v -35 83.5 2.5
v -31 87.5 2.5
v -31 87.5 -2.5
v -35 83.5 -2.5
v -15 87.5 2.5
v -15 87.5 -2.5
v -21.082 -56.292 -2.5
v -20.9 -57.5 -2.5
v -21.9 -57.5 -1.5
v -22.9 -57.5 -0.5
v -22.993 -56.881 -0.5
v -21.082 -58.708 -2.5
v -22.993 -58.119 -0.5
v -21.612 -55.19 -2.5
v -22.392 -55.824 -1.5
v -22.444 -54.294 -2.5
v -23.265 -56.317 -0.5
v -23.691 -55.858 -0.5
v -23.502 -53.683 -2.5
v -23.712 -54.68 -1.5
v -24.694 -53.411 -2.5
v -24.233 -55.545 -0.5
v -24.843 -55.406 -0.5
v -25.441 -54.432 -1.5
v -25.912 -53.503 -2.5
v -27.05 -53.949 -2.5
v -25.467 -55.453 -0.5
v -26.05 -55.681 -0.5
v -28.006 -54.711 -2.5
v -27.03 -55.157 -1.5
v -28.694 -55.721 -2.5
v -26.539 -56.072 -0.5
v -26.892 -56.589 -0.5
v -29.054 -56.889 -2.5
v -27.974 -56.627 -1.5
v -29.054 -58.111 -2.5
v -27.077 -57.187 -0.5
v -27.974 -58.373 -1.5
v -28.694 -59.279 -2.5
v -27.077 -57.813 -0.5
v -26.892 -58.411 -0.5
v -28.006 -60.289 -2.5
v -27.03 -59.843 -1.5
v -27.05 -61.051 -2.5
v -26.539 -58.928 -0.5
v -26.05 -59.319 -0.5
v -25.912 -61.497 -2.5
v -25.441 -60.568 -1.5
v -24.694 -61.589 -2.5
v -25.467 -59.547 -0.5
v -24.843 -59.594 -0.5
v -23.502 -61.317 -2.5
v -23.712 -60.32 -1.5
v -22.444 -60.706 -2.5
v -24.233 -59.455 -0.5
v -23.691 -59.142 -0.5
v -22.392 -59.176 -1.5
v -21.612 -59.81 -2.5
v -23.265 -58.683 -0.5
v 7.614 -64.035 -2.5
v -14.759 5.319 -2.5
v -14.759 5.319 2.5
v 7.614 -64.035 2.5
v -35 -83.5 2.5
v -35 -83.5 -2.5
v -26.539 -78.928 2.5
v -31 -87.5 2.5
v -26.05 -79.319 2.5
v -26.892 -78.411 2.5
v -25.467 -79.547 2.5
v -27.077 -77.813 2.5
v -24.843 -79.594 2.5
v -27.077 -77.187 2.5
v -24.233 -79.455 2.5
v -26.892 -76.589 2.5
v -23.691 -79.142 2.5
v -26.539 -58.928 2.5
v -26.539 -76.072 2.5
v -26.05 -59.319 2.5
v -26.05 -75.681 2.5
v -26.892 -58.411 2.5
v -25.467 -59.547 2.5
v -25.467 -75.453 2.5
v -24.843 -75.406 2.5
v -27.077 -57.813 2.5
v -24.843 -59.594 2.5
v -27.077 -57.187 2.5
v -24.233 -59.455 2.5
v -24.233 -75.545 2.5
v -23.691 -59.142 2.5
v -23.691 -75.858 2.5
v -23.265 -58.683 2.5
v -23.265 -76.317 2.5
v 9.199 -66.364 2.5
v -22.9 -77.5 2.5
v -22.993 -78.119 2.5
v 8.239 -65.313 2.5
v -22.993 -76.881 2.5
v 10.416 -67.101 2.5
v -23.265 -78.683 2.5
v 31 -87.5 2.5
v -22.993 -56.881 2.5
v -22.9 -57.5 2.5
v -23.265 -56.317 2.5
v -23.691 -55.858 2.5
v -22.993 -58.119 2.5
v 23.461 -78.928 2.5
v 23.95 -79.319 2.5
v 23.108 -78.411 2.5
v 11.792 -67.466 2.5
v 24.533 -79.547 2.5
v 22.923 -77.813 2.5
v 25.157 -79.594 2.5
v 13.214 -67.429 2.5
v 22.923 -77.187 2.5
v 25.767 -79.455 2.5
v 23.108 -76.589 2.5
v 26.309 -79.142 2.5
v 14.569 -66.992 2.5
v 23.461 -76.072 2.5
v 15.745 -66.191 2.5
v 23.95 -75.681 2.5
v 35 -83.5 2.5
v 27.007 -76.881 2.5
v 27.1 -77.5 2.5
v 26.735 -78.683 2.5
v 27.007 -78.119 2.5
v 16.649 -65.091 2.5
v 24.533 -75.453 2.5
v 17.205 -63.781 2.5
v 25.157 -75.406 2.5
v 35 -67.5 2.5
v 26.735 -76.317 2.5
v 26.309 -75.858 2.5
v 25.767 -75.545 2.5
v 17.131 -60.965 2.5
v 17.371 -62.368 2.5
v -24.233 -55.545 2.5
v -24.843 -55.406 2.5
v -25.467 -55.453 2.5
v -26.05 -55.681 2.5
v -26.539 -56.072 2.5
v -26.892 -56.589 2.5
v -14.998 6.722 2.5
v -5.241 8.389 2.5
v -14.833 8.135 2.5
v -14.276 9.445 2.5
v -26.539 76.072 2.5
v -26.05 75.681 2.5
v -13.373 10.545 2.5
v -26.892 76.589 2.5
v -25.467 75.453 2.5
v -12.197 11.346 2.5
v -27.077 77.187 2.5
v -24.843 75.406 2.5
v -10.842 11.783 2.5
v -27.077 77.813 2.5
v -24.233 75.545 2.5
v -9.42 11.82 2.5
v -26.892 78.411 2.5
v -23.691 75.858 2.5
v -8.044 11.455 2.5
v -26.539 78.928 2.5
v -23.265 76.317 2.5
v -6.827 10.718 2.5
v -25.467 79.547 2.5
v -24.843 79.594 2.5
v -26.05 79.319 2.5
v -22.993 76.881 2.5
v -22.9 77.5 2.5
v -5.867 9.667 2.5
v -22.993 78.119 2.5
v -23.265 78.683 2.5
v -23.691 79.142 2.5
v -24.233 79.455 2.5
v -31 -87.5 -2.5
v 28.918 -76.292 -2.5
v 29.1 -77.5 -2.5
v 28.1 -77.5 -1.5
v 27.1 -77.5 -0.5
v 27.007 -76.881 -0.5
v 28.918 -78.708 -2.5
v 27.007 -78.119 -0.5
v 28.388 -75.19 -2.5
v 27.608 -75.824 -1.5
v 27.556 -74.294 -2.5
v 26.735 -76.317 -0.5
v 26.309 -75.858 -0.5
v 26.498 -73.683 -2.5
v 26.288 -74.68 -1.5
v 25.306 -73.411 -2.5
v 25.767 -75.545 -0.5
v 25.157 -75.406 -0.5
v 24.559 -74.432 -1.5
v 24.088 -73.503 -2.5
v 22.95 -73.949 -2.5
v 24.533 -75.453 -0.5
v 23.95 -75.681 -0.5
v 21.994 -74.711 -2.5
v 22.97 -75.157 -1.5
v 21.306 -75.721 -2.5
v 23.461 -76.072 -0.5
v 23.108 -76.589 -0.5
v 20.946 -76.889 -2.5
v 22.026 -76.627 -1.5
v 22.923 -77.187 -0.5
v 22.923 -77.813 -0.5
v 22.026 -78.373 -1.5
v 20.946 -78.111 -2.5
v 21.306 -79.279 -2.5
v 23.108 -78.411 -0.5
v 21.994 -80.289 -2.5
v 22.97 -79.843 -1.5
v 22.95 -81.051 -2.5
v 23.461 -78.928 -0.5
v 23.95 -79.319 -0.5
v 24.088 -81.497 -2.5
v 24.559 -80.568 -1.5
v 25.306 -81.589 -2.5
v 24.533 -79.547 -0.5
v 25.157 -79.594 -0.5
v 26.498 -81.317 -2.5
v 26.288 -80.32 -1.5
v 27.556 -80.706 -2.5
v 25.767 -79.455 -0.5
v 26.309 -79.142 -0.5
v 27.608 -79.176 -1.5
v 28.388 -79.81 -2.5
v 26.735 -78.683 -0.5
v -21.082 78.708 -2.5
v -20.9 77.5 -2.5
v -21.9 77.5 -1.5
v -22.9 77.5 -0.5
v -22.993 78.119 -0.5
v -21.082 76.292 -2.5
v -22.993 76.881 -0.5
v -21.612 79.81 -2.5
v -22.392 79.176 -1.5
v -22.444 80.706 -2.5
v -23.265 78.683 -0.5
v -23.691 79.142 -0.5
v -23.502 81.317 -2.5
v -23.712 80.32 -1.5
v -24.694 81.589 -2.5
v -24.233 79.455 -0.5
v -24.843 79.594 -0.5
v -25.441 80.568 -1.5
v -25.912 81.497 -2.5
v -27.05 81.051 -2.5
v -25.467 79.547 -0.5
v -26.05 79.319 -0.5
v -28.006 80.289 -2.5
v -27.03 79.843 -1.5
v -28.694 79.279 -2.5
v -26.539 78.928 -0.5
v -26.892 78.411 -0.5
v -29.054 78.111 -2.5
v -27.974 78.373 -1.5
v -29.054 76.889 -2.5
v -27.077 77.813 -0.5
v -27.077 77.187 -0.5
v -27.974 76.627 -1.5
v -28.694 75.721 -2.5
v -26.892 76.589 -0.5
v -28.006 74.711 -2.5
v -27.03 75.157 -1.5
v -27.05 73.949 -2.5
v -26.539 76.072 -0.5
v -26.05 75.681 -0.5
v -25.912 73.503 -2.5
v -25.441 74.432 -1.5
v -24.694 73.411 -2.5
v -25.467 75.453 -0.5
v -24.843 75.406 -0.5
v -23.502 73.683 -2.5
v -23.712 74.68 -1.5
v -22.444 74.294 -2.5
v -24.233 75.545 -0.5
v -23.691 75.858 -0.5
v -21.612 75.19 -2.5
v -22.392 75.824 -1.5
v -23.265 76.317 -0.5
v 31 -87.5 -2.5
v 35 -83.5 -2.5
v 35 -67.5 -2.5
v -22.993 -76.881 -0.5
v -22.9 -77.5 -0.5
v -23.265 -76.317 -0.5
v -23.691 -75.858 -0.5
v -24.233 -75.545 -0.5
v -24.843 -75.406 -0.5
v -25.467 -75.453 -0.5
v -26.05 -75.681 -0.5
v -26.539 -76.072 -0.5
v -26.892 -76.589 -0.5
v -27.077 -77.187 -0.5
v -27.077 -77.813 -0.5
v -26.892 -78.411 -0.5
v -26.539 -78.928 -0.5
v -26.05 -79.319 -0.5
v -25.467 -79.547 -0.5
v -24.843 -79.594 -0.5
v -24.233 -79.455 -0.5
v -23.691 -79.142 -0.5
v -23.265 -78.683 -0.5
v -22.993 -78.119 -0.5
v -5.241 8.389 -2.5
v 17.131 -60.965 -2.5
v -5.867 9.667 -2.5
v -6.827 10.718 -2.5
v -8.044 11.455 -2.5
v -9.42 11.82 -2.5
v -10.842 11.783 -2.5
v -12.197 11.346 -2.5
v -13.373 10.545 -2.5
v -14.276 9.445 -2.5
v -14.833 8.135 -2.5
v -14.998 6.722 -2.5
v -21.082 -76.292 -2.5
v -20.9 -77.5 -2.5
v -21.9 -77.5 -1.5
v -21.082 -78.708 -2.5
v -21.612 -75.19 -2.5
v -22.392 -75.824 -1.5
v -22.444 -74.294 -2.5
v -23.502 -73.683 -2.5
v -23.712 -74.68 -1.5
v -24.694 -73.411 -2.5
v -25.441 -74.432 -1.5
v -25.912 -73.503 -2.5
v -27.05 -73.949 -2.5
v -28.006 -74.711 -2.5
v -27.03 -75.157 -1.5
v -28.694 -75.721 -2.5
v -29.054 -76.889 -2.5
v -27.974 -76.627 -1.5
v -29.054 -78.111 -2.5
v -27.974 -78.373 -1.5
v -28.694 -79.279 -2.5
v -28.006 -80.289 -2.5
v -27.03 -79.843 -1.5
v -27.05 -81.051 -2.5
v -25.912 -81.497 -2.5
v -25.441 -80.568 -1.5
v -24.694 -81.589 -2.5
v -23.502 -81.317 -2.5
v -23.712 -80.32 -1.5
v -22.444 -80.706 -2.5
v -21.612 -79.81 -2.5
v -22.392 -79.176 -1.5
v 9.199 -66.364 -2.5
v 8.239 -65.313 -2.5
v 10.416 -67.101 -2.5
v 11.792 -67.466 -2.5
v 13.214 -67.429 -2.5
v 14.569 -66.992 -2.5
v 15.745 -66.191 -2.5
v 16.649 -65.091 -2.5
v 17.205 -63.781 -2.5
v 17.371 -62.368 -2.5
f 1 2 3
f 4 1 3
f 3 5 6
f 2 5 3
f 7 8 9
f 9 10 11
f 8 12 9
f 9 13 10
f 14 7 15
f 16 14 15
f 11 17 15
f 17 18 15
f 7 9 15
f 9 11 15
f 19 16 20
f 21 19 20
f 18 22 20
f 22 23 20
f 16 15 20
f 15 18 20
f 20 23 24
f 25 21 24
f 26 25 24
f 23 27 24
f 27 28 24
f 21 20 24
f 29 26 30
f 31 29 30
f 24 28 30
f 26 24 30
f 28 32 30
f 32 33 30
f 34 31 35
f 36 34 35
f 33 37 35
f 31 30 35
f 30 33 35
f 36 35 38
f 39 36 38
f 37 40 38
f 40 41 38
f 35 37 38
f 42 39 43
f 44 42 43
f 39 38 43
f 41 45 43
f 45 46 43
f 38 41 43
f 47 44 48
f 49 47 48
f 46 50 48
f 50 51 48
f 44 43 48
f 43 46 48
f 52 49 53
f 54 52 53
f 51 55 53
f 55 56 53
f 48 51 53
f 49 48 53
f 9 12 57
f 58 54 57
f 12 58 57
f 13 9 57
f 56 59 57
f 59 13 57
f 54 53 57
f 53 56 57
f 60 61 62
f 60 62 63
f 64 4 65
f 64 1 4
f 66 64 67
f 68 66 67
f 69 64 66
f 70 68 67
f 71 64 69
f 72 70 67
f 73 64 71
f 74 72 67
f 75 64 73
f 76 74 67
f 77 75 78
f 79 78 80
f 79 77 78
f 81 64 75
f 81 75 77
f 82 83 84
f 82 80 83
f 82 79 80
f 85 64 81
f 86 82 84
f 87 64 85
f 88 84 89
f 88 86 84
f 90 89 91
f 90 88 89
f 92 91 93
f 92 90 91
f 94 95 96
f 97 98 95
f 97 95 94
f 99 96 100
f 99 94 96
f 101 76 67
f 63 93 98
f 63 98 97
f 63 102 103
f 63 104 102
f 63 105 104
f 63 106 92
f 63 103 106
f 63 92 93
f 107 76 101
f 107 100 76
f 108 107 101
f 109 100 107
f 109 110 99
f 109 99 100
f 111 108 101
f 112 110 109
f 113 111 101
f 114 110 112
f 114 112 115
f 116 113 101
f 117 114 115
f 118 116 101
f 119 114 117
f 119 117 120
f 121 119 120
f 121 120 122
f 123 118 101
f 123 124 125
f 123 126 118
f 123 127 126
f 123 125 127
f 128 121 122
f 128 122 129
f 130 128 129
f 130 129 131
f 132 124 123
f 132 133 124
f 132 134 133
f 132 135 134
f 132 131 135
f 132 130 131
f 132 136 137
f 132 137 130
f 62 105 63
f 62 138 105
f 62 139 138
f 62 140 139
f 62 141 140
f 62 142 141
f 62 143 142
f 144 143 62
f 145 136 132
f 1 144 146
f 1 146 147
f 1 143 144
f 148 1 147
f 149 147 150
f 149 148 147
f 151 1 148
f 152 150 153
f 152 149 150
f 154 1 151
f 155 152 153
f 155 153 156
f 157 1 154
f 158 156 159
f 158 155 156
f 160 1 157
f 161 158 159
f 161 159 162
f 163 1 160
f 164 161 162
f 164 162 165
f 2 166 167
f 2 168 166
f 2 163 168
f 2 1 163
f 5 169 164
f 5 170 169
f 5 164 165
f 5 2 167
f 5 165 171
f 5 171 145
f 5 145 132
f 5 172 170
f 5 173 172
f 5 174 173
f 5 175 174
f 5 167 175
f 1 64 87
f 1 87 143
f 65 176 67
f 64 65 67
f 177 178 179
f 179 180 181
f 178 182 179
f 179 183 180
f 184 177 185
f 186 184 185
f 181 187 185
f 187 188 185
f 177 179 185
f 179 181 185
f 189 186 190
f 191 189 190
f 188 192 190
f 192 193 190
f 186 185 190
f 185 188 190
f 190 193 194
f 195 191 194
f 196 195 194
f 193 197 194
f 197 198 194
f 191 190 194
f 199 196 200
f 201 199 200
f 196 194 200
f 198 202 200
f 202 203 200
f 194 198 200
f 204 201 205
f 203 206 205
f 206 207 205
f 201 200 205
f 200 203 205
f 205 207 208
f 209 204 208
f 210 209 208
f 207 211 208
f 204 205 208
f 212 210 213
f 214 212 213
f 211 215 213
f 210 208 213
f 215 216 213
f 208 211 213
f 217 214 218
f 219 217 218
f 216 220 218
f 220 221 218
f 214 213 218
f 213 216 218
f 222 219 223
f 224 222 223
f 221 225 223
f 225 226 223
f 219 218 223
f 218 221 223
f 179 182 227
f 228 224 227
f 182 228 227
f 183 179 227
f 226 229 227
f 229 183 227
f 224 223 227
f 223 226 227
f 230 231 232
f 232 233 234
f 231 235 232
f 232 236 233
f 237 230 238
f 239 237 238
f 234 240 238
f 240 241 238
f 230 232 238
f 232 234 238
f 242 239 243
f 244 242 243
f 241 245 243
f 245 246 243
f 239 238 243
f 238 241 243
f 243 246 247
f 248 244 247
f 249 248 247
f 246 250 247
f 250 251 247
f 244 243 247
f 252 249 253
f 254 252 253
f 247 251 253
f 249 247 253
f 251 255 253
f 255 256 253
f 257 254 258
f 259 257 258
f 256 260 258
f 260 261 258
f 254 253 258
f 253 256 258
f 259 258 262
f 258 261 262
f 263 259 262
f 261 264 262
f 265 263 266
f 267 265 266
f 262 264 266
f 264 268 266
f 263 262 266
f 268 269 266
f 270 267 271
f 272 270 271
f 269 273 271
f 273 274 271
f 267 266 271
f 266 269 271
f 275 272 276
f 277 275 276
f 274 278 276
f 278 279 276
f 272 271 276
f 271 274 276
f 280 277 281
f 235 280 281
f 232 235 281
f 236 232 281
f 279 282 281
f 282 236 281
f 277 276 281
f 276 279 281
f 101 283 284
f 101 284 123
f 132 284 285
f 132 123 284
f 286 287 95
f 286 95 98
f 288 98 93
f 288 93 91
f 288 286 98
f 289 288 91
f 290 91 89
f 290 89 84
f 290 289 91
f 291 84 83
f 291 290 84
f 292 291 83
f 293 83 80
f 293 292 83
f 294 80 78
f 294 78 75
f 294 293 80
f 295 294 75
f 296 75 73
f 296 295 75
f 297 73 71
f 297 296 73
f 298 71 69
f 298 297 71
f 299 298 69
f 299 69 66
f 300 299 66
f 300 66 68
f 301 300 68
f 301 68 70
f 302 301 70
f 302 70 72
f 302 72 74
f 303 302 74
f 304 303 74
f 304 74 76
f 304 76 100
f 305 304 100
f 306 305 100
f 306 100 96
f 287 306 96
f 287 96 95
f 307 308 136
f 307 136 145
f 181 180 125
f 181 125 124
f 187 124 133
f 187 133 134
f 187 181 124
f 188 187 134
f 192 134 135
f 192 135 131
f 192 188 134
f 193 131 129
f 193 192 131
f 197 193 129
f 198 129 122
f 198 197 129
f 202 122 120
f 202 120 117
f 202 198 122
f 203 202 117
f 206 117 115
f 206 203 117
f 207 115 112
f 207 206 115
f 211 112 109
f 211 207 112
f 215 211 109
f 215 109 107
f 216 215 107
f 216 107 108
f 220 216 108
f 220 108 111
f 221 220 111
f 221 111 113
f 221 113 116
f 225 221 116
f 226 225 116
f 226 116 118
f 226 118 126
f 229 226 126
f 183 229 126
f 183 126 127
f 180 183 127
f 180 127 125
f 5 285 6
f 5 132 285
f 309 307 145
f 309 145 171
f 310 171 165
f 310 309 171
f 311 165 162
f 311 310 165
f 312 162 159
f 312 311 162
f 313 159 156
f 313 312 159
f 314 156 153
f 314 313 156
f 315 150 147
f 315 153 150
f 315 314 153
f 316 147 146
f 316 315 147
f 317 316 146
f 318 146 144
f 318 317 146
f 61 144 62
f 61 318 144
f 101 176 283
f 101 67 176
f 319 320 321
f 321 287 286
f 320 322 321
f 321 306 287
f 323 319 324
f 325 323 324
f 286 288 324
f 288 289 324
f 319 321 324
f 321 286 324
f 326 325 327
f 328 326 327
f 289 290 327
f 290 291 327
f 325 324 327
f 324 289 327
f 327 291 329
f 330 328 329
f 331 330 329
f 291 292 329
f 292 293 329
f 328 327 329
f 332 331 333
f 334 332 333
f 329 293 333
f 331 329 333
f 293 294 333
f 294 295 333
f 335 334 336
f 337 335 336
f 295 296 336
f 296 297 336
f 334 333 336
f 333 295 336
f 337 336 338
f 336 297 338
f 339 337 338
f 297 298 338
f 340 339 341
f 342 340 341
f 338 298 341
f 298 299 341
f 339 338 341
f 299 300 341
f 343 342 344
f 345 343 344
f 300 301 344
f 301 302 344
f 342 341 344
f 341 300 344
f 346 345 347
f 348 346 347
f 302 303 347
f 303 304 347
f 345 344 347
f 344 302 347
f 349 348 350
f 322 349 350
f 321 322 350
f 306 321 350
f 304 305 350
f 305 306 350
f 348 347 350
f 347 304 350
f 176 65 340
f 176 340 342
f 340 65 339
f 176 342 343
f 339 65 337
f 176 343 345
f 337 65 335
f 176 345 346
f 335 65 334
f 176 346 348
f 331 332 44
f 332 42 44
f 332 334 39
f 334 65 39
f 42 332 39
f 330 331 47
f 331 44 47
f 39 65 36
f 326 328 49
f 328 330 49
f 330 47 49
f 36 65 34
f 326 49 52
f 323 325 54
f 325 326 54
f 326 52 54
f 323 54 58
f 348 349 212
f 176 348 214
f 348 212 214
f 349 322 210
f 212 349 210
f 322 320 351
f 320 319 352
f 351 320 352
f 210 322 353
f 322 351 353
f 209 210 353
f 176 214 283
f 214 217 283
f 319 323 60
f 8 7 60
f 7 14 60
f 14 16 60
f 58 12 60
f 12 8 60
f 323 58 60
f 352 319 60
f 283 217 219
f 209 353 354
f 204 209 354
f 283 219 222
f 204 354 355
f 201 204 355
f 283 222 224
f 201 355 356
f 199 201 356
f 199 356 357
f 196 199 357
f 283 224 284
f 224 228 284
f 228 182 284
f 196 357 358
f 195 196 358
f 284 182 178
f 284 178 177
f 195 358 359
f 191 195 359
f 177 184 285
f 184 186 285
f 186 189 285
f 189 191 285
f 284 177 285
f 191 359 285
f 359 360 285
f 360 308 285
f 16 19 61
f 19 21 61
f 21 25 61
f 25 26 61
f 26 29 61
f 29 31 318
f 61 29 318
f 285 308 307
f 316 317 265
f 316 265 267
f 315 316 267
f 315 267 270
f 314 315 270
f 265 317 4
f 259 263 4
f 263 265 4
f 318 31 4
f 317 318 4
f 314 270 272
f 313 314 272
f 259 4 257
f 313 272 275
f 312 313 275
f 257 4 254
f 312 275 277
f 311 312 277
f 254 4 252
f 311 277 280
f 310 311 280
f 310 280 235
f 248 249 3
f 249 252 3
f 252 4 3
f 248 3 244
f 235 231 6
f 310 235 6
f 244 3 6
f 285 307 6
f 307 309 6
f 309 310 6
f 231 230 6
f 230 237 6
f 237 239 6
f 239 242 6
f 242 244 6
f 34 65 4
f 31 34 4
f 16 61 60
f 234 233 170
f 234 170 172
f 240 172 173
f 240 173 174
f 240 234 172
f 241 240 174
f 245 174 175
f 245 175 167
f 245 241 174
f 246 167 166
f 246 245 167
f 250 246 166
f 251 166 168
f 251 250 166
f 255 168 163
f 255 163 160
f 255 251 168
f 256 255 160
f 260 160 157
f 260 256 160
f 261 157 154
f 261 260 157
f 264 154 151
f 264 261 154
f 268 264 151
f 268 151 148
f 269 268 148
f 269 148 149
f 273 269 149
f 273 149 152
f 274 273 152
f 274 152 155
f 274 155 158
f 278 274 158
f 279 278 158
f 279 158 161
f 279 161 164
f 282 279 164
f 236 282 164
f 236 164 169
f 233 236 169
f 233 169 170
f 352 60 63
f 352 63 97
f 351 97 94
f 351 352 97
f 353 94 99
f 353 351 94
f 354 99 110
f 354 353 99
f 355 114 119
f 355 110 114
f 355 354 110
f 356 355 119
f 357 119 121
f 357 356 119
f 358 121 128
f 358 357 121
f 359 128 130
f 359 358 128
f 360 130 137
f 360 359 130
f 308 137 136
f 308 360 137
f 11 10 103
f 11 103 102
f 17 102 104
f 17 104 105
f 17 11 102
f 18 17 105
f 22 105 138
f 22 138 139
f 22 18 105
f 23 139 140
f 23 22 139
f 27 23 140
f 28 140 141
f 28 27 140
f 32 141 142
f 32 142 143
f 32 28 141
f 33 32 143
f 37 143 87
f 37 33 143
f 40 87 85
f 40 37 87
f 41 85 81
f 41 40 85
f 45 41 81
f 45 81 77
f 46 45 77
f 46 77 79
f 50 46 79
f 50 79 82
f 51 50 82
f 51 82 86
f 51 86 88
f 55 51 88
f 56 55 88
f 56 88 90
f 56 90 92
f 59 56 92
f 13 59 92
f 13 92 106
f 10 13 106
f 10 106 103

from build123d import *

# Parameters (mm, degrees)
SKETCH_1_R          = 2.1
EXTRUDE_1_DEPTH     = 2.5
CHAMFER_1_SIZE      = 4
CHAMFER_2_SIZE      = 2
CUT_EXTRUDE_1_DEPTH = 95.372930441


with BuildPart() as part:
    # 草图1 → 凸台-拉伸1 (new, symmetric)
    with BuildSketch(Plane.XY):
        Polygon((-35, 87.5), (-35, -87.5), (35, -87.5), (35, -67.5), (-15, 87.5), align=None)
        with Locations((-25, -77.5)):
            Circle(SKETCH_1_R, mode=Mode.SUBTRACT)
        with Locations((25, -77.5)):
            Circle(SKETCH_1_R, mode=Mode.SUBTRACT)
        with Locations((-25, 77.5)):
            Circle(SKETCH_1_R, mode=Mode.SUBTRACT)
        with Locations((-25, -57.5)):
            Circle(SKETCH_1_R, mode=Mode.SUBTRACT)
    extrude(amount=EXTRUDE_1_DEPTH, both=True)

    # 倒角1
    chamfer_1_edges = [part.edges().sort_by_distance(p)[0] for p in [
        (-35, -87.5, 0),
        (-35, 87.5, 0),
        (35, -87.5, 0),
    ]]
    chamfer(chamfer_1_edges, length=CHAMFER_1_SIZE)

    # 倒角2
    chamfer_2_edges = [part.edges().sort_by_distance(p)[0] for p in [
        (22.9, -77.5, -2.5),
        (-27.1, -77.5, -2.5),
        (-27.1, 77.5, -2.5),
        (-27.1, -57.5, -2.5),
    ]]
    chamfer(chamfer_2_edges, length=CHAMFER_2_SIZE)

    # 草图2 → 切除-拉伸1 (cut, through all)
    with BuildSketch(Plane(origin=(0, 0, -2.5), x_dir=(-1, 0, 0), z_dir=(0, 0, -1))):
        with BuildLine():
            Line((-17.130804412, -60.9649861), (5.241456911, 8.389024))
            ThreePointArc((5.241456911, 8.389024), (11.5350139, 11.612553189), (14.758543089, 5.318996201))
            Line((14.758543089, 5.318996201), (-7.613718234, -64.0350139))
            ThreePointArc((-7.613718234, -64.0350139), (-13.907275222, -67.258543089), (-17.130804412, -60.9649861))
        make_face()
    extrude(amount=-CUT_EXTRUDE_1_DEPTH, mode=Mode.SUBTRACT)


solid = part.part
